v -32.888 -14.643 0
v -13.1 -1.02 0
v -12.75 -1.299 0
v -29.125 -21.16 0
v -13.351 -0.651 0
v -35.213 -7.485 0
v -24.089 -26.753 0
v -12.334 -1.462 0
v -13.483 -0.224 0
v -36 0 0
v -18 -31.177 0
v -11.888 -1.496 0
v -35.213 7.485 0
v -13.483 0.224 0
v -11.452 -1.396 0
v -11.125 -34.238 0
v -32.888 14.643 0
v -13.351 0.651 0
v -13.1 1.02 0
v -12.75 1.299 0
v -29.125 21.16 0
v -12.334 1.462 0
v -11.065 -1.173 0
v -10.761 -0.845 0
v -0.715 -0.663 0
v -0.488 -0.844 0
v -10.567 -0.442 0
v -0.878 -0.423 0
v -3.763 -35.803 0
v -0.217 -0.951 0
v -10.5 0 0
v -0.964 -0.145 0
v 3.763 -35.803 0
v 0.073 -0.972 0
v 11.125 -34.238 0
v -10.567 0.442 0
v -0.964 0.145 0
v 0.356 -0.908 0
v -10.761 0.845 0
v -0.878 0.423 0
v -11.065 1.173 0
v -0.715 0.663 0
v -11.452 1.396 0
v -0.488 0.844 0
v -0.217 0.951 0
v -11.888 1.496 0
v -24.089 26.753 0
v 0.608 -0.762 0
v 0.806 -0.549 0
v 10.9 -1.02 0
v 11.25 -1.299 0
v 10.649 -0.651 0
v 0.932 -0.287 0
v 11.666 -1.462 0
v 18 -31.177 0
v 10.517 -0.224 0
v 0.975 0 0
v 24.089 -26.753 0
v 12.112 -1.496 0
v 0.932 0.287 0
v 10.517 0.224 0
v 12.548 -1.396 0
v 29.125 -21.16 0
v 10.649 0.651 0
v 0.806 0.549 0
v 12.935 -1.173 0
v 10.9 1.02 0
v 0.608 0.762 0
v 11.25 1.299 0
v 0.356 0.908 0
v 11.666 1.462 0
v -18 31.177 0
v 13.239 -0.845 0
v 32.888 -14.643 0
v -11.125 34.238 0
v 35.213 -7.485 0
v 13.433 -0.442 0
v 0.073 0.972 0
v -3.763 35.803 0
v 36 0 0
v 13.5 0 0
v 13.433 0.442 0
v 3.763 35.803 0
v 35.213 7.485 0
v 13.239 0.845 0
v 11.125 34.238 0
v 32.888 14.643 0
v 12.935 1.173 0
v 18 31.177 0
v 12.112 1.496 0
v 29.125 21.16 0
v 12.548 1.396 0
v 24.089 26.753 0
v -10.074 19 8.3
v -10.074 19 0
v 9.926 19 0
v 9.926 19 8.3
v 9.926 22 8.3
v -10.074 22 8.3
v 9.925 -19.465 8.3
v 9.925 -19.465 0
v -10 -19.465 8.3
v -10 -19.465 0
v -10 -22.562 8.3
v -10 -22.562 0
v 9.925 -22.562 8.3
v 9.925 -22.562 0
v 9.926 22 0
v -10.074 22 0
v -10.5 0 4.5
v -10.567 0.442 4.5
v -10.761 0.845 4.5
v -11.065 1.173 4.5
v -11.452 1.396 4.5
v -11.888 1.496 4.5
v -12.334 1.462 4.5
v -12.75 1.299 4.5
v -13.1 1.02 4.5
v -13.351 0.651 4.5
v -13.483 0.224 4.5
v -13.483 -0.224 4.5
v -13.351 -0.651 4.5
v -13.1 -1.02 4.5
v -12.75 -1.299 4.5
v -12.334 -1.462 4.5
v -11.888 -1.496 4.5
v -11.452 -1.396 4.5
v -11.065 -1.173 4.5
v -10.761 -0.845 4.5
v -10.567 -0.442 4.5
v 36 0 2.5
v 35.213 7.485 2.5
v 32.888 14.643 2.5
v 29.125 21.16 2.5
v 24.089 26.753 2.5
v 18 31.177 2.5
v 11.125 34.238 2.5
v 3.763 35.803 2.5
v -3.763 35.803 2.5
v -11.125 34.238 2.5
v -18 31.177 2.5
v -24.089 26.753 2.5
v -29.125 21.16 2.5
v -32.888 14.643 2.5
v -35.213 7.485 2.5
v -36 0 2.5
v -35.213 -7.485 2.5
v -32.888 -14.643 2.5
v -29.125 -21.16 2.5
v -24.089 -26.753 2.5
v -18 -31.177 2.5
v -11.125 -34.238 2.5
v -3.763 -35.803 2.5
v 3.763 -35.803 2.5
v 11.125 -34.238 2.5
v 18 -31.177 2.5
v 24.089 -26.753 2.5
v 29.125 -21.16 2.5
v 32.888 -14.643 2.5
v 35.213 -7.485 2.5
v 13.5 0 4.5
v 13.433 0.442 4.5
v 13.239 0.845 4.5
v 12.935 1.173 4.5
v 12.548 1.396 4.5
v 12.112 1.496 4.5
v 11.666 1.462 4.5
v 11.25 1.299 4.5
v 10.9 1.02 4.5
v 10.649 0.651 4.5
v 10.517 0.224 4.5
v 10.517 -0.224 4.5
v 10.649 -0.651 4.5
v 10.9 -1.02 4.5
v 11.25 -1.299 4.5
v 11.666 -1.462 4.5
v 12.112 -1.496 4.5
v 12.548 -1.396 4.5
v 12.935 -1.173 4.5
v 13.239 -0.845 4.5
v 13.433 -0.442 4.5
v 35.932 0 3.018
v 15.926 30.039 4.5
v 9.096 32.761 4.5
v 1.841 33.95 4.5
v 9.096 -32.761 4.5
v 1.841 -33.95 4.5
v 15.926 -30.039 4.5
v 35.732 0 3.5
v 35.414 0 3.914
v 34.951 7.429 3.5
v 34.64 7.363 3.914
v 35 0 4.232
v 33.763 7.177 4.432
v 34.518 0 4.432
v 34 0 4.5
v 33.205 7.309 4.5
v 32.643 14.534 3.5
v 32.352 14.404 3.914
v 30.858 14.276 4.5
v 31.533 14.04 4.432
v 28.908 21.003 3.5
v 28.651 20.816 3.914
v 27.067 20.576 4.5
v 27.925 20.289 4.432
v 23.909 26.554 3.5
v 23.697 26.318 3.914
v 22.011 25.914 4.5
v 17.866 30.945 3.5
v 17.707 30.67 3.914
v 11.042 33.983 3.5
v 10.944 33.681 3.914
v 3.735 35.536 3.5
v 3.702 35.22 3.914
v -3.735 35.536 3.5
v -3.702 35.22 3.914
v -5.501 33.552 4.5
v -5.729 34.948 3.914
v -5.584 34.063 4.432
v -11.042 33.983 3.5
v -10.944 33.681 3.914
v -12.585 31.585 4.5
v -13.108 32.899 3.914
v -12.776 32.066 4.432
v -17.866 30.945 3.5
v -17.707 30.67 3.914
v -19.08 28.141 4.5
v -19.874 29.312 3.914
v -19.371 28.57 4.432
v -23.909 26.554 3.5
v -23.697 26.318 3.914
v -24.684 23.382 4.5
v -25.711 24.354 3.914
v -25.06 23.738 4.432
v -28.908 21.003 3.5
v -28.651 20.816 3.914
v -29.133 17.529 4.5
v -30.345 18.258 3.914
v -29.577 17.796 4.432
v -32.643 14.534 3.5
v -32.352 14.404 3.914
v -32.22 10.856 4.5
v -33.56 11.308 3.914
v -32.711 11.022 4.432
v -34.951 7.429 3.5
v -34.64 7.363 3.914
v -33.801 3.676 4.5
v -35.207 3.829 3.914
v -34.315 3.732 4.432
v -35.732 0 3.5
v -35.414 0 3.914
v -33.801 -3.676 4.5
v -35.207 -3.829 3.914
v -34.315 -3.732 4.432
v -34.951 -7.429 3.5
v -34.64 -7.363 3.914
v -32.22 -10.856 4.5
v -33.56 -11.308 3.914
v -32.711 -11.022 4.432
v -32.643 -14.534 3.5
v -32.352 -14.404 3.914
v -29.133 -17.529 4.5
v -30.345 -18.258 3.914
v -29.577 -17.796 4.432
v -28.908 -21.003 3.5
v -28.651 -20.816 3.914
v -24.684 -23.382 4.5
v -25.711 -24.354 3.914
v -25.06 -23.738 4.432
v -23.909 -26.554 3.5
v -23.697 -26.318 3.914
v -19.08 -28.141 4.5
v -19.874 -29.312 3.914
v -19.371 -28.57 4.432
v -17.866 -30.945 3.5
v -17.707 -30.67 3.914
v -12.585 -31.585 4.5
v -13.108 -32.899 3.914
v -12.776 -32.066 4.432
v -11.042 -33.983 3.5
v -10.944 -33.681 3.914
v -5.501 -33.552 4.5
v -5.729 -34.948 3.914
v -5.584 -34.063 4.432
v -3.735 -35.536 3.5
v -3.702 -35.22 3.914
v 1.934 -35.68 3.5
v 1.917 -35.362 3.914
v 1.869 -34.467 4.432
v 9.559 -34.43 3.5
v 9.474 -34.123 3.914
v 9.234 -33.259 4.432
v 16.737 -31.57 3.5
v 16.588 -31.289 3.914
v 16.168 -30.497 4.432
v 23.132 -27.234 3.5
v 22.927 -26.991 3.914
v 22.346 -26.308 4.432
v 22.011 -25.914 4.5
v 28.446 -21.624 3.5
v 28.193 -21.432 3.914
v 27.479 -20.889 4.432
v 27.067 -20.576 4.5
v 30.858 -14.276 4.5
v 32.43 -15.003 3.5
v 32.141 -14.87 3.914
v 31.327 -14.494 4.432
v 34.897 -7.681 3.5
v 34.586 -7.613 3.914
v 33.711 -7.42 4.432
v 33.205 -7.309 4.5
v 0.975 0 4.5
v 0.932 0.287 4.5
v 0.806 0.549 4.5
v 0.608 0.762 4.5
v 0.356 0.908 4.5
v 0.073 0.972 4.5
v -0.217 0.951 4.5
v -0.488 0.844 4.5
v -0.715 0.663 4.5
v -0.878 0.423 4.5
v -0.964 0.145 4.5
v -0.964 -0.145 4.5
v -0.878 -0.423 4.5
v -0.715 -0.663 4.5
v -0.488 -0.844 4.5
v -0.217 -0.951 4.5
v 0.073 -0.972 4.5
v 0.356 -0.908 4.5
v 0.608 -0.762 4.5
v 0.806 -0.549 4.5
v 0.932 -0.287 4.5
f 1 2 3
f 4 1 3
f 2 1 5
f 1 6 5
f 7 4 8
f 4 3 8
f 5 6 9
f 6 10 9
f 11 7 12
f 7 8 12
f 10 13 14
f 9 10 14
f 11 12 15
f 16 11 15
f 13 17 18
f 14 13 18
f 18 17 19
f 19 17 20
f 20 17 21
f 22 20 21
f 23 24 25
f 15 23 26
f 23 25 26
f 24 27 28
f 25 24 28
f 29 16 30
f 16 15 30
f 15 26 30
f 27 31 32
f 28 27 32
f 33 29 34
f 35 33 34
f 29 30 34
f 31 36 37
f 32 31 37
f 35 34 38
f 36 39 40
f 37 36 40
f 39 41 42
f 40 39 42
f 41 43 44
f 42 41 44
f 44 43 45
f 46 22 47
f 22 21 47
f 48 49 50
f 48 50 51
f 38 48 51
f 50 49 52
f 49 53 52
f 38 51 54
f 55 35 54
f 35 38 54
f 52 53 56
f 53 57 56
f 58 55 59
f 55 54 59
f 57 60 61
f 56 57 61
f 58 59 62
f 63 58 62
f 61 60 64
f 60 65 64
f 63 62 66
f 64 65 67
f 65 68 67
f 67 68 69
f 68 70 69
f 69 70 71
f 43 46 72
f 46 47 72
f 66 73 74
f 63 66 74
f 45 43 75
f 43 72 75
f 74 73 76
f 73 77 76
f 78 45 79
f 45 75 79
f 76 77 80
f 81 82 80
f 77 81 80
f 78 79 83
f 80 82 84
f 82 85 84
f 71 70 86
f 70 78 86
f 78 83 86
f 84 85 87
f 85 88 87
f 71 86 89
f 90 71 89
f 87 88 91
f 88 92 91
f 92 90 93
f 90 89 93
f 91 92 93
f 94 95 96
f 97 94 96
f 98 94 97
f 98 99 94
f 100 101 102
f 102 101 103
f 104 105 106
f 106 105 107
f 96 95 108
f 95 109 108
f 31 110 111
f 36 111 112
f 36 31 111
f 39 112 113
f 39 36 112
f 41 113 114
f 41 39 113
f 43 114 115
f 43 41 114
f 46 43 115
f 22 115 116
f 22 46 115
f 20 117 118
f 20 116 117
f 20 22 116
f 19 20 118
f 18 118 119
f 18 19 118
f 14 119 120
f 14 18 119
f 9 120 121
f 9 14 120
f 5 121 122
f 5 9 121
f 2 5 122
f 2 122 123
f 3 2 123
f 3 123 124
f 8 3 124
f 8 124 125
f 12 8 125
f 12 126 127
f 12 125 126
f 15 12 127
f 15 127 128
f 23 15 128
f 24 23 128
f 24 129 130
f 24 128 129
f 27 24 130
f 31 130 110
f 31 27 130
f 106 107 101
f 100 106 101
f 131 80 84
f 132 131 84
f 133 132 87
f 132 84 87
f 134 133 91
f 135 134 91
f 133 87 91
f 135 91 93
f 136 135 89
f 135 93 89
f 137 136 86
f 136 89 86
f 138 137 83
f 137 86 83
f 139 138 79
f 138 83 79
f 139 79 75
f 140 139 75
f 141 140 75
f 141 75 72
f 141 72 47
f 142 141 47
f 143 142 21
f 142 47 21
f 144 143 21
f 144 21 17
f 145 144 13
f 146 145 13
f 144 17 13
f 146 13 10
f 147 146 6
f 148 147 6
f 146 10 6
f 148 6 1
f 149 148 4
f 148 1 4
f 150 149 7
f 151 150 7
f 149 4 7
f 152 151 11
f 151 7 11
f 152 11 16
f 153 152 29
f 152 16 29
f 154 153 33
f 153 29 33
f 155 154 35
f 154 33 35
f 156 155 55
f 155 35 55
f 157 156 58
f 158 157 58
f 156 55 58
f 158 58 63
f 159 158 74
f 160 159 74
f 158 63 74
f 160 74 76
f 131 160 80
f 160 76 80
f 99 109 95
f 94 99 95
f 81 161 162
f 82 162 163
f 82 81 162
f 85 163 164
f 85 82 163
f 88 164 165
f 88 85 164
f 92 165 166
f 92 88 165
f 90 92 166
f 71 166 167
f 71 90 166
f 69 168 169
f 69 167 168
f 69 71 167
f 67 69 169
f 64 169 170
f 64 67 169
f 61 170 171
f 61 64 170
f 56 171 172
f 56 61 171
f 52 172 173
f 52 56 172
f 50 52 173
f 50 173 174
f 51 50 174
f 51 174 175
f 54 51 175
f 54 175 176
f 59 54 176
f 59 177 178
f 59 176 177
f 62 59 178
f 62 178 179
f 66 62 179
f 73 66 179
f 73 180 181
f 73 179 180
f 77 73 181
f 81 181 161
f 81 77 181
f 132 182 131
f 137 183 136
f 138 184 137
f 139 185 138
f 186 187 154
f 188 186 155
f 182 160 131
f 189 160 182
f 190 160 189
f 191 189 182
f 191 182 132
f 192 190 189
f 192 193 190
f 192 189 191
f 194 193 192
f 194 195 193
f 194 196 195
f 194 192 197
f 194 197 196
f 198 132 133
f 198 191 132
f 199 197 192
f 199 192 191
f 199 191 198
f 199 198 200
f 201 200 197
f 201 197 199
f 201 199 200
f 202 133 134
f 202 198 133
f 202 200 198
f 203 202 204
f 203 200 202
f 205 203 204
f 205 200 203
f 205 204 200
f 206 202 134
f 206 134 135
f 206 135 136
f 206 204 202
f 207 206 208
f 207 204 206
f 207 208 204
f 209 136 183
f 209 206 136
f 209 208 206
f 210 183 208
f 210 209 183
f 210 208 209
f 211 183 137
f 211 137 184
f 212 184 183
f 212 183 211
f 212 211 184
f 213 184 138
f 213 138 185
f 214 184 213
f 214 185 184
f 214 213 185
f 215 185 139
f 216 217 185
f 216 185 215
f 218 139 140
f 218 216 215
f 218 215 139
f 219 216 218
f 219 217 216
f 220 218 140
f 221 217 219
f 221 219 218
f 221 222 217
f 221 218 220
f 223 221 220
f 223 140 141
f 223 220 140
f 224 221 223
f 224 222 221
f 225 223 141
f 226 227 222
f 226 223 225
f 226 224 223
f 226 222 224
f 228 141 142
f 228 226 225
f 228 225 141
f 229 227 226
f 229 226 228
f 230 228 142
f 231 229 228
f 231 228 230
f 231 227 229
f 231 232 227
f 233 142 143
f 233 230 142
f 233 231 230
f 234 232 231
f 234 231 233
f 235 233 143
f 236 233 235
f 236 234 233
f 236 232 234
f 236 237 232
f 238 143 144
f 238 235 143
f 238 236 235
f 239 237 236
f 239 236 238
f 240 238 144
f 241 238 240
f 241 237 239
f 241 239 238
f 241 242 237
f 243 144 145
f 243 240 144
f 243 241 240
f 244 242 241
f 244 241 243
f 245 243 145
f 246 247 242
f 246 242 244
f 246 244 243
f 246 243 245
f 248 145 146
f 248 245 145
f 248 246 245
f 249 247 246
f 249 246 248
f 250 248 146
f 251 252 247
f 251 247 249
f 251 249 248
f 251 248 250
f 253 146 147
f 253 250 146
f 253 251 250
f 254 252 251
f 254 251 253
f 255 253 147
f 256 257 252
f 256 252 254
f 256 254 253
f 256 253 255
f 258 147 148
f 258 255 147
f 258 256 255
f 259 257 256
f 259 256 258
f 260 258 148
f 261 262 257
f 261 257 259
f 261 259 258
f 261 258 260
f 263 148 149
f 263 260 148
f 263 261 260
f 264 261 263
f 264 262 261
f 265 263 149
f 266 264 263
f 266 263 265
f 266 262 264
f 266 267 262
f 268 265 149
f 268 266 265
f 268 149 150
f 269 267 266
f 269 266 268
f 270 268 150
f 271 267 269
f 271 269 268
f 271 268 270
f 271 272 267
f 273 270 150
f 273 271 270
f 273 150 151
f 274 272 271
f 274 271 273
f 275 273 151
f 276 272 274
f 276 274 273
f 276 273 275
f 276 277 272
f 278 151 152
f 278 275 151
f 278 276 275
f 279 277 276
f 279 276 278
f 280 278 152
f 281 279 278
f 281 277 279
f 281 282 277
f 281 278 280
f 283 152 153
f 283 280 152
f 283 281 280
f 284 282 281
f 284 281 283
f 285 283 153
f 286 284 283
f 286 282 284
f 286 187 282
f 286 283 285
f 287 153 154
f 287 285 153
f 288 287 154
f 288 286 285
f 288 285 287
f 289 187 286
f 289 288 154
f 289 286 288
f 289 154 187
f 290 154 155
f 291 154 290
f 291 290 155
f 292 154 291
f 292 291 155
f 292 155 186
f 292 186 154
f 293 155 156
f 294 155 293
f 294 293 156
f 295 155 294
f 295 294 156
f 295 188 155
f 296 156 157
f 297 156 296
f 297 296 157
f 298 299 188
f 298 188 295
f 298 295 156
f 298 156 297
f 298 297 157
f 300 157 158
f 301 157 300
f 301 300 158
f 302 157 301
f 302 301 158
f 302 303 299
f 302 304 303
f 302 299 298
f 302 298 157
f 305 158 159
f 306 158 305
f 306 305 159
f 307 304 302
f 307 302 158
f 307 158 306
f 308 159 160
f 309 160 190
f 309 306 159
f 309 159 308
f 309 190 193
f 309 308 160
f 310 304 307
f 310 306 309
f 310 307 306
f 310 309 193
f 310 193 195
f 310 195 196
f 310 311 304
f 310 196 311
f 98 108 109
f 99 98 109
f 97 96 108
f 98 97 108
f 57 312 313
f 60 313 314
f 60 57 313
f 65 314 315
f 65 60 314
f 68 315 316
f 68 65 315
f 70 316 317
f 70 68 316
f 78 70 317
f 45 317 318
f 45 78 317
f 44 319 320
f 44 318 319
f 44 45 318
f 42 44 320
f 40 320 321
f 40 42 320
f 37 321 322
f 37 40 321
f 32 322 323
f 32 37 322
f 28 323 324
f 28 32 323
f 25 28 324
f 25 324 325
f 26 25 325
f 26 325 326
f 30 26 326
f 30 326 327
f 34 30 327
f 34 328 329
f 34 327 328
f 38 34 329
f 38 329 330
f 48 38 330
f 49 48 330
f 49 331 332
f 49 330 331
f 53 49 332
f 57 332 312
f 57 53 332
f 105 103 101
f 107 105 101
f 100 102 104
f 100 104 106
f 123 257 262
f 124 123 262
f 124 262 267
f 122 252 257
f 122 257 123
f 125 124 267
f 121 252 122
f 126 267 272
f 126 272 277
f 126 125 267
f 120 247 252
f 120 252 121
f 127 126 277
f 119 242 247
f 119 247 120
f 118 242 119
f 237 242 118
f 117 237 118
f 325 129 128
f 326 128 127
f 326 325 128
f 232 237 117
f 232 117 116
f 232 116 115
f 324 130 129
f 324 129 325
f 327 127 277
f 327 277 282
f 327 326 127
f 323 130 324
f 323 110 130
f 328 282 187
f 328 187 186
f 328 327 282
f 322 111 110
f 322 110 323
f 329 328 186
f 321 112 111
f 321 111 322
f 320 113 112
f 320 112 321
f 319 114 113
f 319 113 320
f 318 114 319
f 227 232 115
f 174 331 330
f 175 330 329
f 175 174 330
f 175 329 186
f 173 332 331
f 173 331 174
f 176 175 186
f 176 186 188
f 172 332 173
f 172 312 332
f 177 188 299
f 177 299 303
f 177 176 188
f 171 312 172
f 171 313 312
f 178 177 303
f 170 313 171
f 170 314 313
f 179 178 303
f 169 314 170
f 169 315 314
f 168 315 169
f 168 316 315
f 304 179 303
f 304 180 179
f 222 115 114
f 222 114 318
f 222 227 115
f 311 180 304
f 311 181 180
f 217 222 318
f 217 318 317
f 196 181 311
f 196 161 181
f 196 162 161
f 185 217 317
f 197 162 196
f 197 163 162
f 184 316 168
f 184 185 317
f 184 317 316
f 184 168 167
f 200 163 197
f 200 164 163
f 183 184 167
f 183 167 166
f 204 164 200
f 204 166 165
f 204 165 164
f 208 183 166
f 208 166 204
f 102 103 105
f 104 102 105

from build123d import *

# Parameters (mm, degrees)
F0_R      = 36
F1_DEPTH  = 4.5
F2_R      = 2
F3_R      = 0.975
F4_DEPTH  = 12.4
F5_R      = 1.5
F6_DEPTH  = 65.8
F8_DEPTH  = 8.3
F10_DEPTH = 8.3


with BuildPart() as f1:
    # F0 (on Top) → F1 (new body)
    with BuildSketch(Plane.XY):
        Circle(F0_R)
    extrude(amount=F1_DEPTH)

    # F2
    f2_edges = [f1.edges().sort_by_distance(p)[0] for p in [
        (-36, 0, 4.5),
    ]]
    fillet(f2_edges, radius=F2_R)

    # F3 (on Top) → F4 (cut)
    with BuildSketch(Plane.XY):
        Circle(F3_R)
    extrude(amount=F4_DEPTH, mode=Mode.SUBTRACT)

    # F5 (on Top) → F6 (cut)
    with BuildSketch(Plane.XY):
        with Locations((-12, 0)):
            Circle(F5_R)
        with Locations((12, 0)):
            Circle(F5_R)
    extrude(amount=F6_DEPTH, mode=Mode.SUBTRACT)


with BuildPart() as f8:
    # F7 (on Top) → F8 (new body)
    with BuildSketch(Plane.XY):
        Polygon((9.924833, -19.465026), (0, -19.465026), (-10, -19.465026), (-10, -22.561671), (9.924833, -22.561671), align=None)
    extrude(amount=F8_DEPTH)


with BuildPart() as f10:
    # F9 (on Top) → F10 (new body)
    with BuildSketch(Plane.XY):
        Polygon((-10.07421, 19), (0, 19), (9.92579, 19), (9.92579, 22), (-10.07421, 22), align=None)
    extrude(amount=F10_DEPTH)


solid = Compound([f1.part, f8.part, f10.part])
